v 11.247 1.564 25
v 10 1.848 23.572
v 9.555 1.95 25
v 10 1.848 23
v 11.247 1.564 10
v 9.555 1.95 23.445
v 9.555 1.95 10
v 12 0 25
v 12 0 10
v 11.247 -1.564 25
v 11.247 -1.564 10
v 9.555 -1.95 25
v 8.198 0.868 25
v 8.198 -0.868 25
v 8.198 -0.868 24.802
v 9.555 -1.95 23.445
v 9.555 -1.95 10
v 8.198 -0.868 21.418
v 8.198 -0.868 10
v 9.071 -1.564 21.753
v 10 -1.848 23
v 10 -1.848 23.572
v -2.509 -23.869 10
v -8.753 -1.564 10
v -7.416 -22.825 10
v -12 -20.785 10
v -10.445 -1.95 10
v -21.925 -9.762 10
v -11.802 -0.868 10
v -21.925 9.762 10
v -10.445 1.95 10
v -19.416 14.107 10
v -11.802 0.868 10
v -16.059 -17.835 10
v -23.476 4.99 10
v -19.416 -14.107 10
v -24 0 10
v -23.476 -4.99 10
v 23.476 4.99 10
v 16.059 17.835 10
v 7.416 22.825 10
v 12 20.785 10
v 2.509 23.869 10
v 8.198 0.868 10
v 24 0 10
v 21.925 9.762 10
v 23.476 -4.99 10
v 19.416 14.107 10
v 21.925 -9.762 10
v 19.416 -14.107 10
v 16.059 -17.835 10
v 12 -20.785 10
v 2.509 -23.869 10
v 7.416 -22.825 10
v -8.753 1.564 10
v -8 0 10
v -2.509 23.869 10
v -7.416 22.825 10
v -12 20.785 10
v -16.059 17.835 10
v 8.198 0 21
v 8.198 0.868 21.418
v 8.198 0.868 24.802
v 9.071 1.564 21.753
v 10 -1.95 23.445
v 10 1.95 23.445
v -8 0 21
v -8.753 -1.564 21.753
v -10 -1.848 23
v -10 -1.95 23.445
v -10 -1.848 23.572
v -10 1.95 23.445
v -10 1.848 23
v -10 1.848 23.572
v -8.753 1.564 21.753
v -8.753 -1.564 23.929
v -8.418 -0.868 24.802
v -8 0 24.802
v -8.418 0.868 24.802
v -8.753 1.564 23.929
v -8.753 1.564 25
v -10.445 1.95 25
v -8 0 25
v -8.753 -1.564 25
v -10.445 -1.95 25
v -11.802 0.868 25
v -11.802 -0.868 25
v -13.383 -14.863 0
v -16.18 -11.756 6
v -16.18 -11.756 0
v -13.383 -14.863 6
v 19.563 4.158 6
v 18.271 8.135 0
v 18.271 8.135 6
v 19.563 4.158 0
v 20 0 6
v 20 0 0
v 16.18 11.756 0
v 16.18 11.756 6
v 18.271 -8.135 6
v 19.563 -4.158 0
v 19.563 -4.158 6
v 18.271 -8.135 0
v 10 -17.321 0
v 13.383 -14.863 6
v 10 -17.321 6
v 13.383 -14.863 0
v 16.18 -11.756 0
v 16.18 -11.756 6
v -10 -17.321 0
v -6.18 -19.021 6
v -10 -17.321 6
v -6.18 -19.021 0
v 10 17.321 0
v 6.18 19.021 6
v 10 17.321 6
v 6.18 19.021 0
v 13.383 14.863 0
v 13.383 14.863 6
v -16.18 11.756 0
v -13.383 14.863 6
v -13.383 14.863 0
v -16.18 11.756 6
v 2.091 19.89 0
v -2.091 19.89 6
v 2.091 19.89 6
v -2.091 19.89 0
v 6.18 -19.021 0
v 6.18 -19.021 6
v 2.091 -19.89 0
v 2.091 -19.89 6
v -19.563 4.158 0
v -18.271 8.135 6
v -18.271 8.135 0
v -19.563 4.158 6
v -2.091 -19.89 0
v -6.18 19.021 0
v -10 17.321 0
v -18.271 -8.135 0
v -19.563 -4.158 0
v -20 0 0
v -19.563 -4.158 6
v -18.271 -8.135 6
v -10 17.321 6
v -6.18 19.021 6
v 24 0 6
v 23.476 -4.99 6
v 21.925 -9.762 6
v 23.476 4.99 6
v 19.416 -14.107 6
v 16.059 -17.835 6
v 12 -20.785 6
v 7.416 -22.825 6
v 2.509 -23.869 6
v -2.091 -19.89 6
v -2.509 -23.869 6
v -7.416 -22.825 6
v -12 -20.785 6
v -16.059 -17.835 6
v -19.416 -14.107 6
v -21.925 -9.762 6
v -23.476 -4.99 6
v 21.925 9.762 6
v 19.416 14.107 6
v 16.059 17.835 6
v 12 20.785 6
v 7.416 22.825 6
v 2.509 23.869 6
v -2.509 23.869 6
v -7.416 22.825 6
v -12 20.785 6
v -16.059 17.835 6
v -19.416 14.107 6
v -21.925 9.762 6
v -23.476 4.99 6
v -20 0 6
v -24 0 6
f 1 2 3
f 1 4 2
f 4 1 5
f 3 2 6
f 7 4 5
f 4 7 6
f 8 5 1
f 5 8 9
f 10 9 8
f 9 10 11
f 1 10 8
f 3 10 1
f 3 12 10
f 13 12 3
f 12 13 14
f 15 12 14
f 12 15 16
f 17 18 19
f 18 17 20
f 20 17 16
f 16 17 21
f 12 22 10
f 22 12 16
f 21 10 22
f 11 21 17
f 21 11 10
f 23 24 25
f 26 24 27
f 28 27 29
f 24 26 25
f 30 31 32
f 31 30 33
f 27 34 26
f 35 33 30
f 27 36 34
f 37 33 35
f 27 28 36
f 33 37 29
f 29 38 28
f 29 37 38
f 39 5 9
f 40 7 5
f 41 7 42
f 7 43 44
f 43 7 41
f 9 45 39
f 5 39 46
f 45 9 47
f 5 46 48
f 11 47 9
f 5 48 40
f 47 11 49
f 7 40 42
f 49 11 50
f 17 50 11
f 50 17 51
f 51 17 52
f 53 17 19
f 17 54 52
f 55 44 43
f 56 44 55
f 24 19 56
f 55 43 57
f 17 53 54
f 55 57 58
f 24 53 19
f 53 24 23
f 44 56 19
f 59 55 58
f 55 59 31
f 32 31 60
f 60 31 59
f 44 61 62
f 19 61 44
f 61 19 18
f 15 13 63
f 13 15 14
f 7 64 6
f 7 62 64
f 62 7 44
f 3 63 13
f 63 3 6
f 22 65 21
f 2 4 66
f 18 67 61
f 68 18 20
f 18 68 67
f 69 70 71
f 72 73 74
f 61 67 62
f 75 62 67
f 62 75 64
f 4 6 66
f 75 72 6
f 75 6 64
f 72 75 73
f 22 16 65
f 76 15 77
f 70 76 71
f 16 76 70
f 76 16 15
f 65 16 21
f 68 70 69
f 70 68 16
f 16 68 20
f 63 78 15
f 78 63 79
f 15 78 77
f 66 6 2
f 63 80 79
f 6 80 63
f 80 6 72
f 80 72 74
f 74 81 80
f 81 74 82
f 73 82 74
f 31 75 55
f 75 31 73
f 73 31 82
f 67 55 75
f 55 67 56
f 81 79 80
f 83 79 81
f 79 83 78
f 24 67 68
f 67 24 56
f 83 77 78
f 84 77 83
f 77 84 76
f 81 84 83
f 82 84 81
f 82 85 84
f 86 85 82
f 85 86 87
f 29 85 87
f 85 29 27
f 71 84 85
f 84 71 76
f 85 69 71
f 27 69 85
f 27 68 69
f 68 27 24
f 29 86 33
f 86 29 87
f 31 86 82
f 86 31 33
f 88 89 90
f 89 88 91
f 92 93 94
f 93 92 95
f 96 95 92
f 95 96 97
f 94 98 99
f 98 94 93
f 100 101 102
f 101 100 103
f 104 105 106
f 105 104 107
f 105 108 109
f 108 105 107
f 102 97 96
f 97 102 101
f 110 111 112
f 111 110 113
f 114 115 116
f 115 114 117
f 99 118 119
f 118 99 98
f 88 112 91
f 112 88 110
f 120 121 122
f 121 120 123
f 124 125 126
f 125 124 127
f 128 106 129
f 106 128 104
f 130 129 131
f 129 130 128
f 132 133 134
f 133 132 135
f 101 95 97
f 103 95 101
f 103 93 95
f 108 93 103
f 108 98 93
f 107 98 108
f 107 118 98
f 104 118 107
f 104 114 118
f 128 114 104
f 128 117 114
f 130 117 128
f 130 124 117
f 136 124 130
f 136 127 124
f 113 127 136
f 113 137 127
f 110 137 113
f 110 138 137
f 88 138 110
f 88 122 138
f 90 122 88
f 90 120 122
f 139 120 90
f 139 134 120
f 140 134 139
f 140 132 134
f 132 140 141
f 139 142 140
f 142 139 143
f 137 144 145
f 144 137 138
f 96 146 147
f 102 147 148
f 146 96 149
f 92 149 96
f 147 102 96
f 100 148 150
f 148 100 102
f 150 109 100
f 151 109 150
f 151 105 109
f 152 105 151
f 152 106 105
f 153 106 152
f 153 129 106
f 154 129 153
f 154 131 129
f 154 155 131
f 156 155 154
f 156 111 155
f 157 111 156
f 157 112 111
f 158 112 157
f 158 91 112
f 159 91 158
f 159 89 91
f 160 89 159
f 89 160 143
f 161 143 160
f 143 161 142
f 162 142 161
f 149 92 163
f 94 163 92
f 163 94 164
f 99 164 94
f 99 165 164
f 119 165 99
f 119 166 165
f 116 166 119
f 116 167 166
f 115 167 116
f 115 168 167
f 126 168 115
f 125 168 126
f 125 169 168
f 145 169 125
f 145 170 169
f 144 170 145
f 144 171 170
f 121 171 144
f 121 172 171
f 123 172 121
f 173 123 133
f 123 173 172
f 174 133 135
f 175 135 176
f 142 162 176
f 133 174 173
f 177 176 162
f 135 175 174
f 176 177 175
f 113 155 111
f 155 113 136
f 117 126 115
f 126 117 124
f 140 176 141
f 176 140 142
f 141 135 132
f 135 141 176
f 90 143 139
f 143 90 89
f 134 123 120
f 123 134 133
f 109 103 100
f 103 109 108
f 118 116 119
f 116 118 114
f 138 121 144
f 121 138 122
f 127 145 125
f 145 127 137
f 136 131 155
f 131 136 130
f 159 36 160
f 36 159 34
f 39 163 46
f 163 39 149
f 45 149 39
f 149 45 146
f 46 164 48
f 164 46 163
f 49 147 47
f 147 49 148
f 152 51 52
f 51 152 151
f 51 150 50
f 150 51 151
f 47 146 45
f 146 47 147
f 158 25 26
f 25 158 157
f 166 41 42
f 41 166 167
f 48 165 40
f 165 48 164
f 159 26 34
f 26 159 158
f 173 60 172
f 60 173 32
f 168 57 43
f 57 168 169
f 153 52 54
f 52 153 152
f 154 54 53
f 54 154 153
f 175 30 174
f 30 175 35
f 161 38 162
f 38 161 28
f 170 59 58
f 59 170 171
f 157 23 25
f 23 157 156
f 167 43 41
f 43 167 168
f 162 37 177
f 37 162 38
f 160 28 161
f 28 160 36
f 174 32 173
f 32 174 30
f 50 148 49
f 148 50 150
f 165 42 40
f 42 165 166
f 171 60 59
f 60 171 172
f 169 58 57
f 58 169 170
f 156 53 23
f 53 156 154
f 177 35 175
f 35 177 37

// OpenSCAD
lowerCircleRadius = 20;
lowerCircleHeight = 6;

upperCircleRadius = 24;
upperCircleHeight = 4;

handle = true;

handleRadius = 2;
handleHeight = 15;
handleWidth = 20;

module segment(height, radius) {
    cylinder(height, radius, radius);
}
// lower circle
segment(lowerCircleHeight, lowerCircleRadius);

// upper circle
translate([0, 0, lowerCircleHeight]) {
    segment(upperCircleHeight, upperCircleRadius);
}

// handle
if(handle) {  
    height = lowerCircleHeight + upperCircleHeight;
    union() {
        // |-| [0]
        translate([handleWidth / 2, 0, height]) {
            segment(handleHeight, handleRadius);
        }
        
        // |-| [1]
        translate([0 - (handleWidth / 2), 0, height + handleHeight - handleRadius]) {            
            rotate([0, 90, 0]) {
                segment(handleWidth, handleRadius);
            }
        }
        
        // |-| [2]
        translate([0 - (handleWidth / 2), 0, height]) {
            segment(handleHeight, handleRadius);
        }
    }
}
